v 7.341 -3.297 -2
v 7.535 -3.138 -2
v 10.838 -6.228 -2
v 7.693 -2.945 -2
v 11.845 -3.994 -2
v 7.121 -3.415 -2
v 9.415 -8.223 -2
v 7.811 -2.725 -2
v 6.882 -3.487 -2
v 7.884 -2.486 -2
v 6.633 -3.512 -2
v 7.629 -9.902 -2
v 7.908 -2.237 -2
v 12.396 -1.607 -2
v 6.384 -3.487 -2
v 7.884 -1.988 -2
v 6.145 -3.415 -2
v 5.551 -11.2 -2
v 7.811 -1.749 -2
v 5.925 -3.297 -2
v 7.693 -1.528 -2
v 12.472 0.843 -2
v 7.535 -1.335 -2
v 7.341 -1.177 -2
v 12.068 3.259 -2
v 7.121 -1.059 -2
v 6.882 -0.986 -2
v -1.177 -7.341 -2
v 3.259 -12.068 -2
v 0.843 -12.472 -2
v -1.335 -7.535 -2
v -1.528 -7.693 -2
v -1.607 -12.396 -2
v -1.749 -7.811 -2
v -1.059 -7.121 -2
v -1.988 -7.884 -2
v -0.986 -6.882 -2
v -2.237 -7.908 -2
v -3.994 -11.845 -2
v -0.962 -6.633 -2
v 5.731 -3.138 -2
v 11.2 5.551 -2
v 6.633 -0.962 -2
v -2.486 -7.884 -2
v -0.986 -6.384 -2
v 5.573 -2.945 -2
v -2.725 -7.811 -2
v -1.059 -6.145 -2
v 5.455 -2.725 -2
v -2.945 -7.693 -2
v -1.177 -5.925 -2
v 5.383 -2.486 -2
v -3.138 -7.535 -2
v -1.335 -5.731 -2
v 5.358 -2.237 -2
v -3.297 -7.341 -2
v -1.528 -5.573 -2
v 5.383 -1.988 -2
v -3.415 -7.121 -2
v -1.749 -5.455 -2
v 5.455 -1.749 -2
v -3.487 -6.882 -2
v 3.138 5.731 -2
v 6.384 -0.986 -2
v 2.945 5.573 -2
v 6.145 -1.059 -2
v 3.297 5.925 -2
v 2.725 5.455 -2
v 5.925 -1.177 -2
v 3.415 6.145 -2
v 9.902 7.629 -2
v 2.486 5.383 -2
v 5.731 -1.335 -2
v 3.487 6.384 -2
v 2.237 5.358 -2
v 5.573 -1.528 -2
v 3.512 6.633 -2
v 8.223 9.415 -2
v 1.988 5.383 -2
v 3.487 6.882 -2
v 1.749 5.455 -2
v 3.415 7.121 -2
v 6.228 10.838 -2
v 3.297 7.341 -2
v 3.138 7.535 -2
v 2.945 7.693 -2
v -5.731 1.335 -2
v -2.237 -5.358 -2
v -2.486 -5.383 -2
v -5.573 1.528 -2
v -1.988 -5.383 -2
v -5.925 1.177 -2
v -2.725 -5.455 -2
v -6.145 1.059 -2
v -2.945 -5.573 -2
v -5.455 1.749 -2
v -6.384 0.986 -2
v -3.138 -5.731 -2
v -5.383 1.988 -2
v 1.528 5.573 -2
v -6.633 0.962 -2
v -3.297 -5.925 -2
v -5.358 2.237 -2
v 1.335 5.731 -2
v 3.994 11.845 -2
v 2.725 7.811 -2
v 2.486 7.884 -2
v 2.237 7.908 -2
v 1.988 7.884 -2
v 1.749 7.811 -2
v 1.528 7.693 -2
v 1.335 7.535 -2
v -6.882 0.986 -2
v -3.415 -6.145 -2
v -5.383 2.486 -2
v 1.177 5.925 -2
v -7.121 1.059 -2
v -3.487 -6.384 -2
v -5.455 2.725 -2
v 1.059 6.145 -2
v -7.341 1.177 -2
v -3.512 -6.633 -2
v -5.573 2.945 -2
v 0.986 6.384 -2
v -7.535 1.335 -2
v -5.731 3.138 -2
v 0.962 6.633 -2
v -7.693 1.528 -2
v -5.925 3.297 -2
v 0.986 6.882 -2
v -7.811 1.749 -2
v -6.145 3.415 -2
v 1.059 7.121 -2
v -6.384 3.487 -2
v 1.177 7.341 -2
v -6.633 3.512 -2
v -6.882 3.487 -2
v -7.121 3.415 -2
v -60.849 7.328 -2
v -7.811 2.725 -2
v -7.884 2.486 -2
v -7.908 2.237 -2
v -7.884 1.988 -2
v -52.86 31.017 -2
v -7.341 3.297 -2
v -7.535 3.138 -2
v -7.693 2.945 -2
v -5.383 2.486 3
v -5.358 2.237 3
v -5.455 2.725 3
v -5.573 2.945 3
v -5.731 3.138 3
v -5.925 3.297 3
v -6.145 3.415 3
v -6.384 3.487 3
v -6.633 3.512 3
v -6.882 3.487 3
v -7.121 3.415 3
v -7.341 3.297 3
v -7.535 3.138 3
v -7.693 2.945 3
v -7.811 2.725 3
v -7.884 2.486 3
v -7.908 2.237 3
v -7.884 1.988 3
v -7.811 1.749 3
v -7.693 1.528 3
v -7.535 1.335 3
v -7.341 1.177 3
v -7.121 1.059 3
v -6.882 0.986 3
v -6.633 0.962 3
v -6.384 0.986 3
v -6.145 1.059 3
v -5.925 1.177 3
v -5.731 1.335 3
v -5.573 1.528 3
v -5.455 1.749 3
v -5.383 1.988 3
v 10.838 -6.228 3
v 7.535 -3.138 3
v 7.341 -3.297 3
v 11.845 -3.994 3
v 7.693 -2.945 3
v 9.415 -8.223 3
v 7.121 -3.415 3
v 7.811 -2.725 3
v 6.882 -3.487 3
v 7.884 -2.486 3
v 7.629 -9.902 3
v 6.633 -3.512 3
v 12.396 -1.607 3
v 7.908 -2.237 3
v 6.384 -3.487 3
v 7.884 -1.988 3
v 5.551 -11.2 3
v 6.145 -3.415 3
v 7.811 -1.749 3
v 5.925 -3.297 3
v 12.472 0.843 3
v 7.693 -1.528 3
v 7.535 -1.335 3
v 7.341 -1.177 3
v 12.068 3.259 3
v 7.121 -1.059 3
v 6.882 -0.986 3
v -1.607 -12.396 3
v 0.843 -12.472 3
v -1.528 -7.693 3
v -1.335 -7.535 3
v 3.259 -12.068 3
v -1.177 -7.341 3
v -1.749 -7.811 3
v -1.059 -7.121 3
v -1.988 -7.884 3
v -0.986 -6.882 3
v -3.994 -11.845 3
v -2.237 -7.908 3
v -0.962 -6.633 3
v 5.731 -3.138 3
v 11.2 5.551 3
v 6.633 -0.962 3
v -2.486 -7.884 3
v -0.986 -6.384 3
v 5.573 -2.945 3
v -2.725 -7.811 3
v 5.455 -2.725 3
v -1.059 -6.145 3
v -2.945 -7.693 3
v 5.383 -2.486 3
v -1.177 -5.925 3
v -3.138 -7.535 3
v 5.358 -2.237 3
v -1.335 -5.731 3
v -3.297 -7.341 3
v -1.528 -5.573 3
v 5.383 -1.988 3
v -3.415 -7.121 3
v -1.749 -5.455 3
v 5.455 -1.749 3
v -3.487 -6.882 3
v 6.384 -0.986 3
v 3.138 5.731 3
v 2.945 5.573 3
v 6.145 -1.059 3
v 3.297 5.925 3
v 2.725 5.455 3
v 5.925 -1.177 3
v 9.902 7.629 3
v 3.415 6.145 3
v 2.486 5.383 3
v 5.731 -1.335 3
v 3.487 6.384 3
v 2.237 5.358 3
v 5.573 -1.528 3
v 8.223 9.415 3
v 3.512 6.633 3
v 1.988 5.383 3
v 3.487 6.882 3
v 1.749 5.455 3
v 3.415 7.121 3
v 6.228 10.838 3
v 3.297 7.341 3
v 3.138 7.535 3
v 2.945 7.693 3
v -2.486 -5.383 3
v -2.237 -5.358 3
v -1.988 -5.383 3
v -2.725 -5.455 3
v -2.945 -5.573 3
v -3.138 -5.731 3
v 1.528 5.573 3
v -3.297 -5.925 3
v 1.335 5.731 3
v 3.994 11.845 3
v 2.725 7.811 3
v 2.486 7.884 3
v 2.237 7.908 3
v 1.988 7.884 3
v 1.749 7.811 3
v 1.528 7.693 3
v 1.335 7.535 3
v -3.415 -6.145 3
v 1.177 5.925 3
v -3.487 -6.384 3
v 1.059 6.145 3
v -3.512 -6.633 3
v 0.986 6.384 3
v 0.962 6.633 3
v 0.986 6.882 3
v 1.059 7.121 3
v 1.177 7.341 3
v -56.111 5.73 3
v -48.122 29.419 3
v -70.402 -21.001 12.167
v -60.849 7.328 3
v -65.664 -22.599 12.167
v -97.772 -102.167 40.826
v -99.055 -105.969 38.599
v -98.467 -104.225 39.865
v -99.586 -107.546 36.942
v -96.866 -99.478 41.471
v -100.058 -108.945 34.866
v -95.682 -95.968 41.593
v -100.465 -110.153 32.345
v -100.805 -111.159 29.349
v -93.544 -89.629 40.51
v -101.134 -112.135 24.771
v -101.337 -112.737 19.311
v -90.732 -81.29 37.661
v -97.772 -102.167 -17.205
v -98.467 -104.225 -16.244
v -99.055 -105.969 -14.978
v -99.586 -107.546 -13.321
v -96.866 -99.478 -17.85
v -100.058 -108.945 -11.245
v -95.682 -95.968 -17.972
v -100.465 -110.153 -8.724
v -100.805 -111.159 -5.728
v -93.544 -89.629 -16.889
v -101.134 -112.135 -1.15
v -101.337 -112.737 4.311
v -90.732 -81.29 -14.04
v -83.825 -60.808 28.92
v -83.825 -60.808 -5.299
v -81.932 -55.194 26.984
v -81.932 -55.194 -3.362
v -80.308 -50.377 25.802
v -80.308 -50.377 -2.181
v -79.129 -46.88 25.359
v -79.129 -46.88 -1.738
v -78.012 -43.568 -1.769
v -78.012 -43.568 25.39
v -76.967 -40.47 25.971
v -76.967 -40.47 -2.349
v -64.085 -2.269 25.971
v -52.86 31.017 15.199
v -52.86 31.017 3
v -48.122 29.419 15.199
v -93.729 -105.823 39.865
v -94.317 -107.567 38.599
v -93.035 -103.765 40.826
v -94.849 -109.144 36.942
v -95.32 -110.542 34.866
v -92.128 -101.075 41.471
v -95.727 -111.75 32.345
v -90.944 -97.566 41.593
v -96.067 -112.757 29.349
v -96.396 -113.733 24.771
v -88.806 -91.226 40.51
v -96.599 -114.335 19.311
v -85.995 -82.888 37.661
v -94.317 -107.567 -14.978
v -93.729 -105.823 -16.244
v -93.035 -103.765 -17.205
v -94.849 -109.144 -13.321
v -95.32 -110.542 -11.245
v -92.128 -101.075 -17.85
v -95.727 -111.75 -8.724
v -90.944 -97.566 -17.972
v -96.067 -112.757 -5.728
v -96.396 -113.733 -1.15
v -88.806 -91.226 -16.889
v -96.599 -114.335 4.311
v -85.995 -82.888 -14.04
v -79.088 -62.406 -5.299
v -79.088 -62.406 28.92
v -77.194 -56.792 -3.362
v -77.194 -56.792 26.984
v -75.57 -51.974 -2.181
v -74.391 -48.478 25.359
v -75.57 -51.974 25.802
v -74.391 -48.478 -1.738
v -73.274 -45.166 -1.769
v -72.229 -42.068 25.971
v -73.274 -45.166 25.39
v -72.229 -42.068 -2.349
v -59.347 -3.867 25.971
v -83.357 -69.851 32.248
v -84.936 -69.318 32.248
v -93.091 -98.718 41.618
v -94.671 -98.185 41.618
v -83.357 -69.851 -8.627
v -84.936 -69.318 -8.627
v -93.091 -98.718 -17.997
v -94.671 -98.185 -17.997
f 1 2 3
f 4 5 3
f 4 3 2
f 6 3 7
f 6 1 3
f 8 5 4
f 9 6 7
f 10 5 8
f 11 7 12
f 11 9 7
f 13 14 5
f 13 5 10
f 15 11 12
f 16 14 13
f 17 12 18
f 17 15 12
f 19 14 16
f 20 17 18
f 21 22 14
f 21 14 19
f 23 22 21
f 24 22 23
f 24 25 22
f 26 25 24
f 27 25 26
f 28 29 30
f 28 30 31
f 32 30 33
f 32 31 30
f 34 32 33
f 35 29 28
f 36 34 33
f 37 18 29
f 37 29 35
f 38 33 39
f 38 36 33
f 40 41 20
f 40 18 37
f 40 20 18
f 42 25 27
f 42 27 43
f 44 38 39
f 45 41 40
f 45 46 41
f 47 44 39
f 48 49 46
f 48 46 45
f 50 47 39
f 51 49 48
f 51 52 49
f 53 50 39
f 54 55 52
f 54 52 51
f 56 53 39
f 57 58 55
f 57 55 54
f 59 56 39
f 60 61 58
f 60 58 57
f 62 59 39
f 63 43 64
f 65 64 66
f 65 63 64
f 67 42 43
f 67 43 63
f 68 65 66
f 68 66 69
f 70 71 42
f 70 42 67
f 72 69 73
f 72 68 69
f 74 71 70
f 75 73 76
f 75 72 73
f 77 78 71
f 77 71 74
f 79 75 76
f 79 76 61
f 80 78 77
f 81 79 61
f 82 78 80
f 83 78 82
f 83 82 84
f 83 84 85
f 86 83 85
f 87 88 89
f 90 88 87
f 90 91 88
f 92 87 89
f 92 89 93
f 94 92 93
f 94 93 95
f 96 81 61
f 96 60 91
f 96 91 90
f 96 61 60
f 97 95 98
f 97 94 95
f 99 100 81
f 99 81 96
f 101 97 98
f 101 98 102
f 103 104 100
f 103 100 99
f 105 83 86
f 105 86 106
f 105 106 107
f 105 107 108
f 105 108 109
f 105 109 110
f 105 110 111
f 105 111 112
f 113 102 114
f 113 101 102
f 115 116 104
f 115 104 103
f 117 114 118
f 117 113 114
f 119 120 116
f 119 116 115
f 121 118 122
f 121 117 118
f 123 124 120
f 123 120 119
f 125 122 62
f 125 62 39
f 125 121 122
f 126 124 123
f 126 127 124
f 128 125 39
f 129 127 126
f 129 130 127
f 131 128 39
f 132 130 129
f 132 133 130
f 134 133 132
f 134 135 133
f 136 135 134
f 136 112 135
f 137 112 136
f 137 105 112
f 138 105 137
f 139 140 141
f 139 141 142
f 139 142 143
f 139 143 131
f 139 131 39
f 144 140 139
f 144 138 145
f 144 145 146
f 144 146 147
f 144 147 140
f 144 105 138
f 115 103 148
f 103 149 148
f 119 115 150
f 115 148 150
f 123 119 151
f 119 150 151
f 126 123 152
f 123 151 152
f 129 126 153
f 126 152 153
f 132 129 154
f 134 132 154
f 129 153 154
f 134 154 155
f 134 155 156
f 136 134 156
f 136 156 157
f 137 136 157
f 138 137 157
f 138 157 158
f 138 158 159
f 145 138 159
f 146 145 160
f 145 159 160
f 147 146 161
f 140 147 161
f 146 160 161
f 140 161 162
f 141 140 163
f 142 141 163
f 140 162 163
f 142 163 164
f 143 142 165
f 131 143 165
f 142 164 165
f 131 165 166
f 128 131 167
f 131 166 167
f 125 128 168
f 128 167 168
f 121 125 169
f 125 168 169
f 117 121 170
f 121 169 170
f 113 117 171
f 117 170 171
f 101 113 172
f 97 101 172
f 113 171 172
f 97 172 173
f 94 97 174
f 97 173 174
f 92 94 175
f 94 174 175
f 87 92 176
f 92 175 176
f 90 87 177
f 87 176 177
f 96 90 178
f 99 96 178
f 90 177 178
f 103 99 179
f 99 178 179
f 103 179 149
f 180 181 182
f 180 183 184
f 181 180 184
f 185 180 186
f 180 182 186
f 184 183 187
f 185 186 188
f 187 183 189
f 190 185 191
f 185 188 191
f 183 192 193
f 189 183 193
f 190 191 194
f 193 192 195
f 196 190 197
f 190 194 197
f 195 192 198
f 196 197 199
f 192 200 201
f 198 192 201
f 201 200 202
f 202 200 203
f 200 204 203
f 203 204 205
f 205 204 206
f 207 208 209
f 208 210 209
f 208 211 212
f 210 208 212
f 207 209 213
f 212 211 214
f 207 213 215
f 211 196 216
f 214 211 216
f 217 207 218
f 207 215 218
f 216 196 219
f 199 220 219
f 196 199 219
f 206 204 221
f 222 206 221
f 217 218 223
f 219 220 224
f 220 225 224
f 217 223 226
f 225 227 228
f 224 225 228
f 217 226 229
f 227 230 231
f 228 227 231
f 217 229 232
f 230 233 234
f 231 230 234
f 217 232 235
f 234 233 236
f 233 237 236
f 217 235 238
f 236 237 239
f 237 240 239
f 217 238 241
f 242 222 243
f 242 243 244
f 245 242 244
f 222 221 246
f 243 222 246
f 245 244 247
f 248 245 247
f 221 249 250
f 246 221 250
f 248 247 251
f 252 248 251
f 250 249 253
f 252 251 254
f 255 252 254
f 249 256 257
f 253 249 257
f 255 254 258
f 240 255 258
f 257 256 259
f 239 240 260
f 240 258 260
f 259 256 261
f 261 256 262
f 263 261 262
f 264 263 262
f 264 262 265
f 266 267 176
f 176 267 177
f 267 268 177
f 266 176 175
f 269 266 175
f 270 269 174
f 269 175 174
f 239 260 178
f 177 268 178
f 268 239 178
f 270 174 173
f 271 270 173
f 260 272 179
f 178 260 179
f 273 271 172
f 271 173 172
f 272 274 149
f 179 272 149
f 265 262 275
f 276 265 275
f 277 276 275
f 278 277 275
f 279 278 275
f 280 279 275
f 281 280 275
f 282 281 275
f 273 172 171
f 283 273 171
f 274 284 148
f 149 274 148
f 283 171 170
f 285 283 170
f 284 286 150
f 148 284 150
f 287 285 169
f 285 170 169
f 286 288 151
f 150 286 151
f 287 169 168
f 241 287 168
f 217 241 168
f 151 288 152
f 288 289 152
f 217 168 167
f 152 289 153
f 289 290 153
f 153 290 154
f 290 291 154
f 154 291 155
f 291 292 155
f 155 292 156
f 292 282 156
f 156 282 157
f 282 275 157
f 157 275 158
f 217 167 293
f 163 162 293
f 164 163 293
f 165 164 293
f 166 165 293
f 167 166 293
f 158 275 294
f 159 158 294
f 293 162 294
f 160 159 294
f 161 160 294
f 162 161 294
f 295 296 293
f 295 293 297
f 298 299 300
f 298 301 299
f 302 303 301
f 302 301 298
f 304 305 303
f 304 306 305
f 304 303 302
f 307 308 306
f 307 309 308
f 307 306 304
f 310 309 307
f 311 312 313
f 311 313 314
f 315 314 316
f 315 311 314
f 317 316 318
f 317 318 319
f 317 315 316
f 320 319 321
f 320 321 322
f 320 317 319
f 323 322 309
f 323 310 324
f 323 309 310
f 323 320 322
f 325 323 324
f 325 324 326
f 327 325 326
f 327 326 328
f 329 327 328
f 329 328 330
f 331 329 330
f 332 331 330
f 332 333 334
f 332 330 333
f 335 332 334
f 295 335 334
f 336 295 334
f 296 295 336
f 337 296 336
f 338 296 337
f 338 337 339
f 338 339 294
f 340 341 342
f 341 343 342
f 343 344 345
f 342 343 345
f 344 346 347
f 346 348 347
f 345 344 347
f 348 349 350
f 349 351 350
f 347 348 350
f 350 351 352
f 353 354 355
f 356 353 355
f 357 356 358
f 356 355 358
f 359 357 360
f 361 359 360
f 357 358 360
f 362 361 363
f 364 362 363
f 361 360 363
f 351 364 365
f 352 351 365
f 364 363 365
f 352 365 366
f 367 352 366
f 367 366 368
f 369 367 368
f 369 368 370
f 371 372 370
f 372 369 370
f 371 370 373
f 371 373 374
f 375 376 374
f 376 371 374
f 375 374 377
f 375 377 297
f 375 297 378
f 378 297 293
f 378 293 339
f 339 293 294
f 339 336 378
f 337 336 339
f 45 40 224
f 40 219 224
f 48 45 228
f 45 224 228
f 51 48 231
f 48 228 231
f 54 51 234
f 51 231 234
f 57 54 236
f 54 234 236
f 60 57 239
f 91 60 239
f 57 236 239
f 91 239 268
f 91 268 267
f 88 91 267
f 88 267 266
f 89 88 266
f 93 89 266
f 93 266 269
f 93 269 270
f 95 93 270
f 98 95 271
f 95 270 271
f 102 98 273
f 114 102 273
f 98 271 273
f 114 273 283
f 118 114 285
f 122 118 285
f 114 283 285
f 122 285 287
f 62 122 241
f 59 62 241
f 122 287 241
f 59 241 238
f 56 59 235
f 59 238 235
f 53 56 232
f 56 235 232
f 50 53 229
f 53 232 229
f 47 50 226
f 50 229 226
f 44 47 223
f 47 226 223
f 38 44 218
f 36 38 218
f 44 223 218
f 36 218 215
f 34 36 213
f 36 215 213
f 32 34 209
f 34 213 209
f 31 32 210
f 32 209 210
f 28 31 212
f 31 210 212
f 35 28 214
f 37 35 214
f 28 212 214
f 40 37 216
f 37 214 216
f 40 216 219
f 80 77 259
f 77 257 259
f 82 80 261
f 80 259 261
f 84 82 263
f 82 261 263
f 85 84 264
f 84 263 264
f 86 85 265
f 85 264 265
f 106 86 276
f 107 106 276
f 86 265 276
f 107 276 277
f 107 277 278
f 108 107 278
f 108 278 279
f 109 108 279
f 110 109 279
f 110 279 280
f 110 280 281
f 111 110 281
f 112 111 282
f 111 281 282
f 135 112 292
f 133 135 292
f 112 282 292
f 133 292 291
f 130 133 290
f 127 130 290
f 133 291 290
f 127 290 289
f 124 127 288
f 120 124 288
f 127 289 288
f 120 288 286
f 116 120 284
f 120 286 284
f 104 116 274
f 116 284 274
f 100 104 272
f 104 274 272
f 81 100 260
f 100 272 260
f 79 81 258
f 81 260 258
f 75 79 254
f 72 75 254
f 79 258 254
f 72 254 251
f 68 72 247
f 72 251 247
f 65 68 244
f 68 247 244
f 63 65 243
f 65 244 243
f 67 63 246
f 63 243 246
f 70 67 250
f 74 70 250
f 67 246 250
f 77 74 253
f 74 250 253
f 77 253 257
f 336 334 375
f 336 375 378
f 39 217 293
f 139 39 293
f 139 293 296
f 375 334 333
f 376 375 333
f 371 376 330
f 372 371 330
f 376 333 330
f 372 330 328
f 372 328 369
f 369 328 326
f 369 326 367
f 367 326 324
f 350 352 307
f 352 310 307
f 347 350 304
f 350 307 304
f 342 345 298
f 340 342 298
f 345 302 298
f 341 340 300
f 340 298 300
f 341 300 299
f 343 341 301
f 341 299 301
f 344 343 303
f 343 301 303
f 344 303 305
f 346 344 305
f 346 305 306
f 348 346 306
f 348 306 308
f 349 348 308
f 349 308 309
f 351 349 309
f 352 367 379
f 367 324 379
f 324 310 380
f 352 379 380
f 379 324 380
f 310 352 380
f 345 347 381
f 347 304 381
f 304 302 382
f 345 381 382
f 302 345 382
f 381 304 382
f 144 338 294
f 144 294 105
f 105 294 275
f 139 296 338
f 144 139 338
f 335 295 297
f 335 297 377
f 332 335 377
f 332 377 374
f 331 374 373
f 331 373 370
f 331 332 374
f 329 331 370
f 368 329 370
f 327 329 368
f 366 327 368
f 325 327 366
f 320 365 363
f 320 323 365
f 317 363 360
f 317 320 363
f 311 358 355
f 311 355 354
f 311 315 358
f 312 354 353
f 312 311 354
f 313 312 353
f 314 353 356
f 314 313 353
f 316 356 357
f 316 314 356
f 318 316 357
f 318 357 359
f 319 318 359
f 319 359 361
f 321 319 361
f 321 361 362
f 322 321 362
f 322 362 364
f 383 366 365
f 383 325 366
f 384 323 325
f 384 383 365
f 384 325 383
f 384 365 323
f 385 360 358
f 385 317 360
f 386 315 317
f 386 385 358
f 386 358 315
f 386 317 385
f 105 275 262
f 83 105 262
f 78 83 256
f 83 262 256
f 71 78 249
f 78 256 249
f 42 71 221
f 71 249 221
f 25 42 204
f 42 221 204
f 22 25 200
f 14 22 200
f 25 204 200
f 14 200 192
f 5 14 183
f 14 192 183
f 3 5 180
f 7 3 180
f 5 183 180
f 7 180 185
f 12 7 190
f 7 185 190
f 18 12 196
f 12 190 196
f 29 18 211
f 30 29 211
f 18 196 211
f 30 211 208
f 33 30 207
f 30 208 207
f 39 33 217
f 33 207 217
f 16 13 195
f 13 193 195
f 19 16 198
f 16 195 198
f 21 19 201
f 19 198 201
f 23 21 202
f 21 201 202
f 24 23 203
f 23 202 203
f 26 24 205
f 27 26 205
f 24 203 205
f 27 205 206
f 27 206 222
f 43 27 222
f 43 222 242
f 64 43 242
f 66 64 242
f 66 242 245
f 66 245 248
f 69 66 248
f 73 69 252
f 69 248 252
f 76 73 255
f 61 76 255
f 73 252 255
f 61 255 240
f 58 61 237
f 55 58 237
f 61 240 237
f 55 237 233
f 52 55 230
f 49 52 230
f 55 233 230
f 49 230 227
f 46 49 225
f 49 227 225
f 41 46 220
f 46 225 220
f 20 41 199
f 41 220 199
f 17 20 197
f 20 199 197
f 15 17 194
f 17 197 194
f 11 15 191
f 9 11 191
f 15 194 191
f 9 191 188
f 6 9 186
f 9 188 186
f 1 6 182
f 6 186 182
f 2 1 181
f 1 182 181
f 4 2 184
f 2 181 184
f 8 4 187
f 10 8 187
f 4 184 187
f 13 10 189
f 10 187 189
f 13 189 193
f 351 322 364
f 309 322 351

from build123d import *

# Parameters (mm, degrees)
SKETCH2_R           = 10
SKETCH2_R_2         = 1.275
BOSS_EXTRUDE1_DEPTH = 3
SKETCH3_R           = 1.275
BOSS_EXTRUDE2_DEPTH = 5
BOSS_EXTRUDE3_DEPTH = 5


with BuildPart() as part:
    # Sketch2 → Boss-Extrude1 (new body)
    with BuildSketch(Plane.XY):
        Circle(SKETCH2_R)
        with Locations((6.633008125, -2.236784122)):
            Circle(SKETCH2_R_2, mode=Mode.SUBTRACT)
        with Locations((-2.236784122, -6.633008125)):
            Circle(SKETCH2_R_2, mode=Mode.SUBTRACT)
        with Locations((-6.633008125, 2.236784122)):
            Circle(SKETCH2_R_2, mode=Mode.SUBTRACT)
        with Locations((2.236784122, 6.633008125)):
            Circle(SKETCH2_R_2, mode=Mode.SUBTRACT)
    extrude(amount=BOSS_EXTRUDE1_DEPTH)

    # Sketch3 → Boss-Extrude2 (add)
    with BuildSketch(Plane.XY.offset(3)):
        with BuildLine():
            Line((-3.994257361, -11.844657367), (-60.848612721, 7.327777966))
            Line((-60.848612721, 7.327777966), (-52.860097999, 31.0170927))
            Line((-52.860097999, 31.0170927), (3.994257361, 11.844657367))
            ThreePointArc((3.994257361, 11.844657367), (11.844657367, -3.994257361), (-3.994257361, -11.844657367))
        make_face()
        with Locations((6.633008125, -2.236784122)):
            Circle(SKETCH3_R, mode=Mode.SUBTRACT)
        with Locations((-2.236784122, -6.633008125)):
            Circle(SKETCH3_R, mode=Mode.SUBTRACT)
        with Locations((-6.633008125, 2.236784122)):
            Circle(SKETCH3_R, mode=Mode.SUBTRACT)
        with Locations((2.236784122, 6.633008125)):
            Circle(SKETCH3_R, mode=Mode.SUBTRACT)
    extrude(amount=-BOSS_EXTRUDE2_DEPTH)

    # Sketch4 → Boss-Extrude3 (add)
    with BuildSketch(Plane(origin=(-56.85435536, 19.172435333, 0), x_dir=(0.319540589, 0.947572589, 0), z_dir=(-0.947572589, 0.319540589, 0))):
        with BuildLine():
            Line((-62.942627893, -25.970573692), (-22.627671819, -25.970573692))
            Line((-22.627671819, -25.970573692), (12.5, -15.199288929))
            Line((12.5, -15.199288929), (12.5, -3))
            Line((12.5, -3), (-12.5, -3))
            Line((-12.5, -3), (-42.396291449, -12.167173681))
            Line((-42.396291449, -12.167173681), (-62.942627893, 2.349426308))
            add(Edge.make_bspline(
                [(-62.942627893, 2.349426308), (-87.492278411, -4.509248518), (-135.602543773, 45.42627104), (-139.208088658, -4.310573692)],
                knots=[0, 0, 0, 0, 1, 1, 1, 1], degree=3))
            Line((-139.208088658, -4.310573692), (-139.208088658, -19.310573692))
            add(Edge.make_bspline(
                [(-62.942627893, -25.970573692), (-87.492278411, -19.111898866), (-135.602543773, -69.047418424), (-139.208088658, -19.310573692)],
                knots=[0, 0, 0, 0, 1, 1, 1, 1], degree=3))
        make_face()
    extrude(amount=-BOSS_EXTRUDE3_DEPTH)


solid = part.part
